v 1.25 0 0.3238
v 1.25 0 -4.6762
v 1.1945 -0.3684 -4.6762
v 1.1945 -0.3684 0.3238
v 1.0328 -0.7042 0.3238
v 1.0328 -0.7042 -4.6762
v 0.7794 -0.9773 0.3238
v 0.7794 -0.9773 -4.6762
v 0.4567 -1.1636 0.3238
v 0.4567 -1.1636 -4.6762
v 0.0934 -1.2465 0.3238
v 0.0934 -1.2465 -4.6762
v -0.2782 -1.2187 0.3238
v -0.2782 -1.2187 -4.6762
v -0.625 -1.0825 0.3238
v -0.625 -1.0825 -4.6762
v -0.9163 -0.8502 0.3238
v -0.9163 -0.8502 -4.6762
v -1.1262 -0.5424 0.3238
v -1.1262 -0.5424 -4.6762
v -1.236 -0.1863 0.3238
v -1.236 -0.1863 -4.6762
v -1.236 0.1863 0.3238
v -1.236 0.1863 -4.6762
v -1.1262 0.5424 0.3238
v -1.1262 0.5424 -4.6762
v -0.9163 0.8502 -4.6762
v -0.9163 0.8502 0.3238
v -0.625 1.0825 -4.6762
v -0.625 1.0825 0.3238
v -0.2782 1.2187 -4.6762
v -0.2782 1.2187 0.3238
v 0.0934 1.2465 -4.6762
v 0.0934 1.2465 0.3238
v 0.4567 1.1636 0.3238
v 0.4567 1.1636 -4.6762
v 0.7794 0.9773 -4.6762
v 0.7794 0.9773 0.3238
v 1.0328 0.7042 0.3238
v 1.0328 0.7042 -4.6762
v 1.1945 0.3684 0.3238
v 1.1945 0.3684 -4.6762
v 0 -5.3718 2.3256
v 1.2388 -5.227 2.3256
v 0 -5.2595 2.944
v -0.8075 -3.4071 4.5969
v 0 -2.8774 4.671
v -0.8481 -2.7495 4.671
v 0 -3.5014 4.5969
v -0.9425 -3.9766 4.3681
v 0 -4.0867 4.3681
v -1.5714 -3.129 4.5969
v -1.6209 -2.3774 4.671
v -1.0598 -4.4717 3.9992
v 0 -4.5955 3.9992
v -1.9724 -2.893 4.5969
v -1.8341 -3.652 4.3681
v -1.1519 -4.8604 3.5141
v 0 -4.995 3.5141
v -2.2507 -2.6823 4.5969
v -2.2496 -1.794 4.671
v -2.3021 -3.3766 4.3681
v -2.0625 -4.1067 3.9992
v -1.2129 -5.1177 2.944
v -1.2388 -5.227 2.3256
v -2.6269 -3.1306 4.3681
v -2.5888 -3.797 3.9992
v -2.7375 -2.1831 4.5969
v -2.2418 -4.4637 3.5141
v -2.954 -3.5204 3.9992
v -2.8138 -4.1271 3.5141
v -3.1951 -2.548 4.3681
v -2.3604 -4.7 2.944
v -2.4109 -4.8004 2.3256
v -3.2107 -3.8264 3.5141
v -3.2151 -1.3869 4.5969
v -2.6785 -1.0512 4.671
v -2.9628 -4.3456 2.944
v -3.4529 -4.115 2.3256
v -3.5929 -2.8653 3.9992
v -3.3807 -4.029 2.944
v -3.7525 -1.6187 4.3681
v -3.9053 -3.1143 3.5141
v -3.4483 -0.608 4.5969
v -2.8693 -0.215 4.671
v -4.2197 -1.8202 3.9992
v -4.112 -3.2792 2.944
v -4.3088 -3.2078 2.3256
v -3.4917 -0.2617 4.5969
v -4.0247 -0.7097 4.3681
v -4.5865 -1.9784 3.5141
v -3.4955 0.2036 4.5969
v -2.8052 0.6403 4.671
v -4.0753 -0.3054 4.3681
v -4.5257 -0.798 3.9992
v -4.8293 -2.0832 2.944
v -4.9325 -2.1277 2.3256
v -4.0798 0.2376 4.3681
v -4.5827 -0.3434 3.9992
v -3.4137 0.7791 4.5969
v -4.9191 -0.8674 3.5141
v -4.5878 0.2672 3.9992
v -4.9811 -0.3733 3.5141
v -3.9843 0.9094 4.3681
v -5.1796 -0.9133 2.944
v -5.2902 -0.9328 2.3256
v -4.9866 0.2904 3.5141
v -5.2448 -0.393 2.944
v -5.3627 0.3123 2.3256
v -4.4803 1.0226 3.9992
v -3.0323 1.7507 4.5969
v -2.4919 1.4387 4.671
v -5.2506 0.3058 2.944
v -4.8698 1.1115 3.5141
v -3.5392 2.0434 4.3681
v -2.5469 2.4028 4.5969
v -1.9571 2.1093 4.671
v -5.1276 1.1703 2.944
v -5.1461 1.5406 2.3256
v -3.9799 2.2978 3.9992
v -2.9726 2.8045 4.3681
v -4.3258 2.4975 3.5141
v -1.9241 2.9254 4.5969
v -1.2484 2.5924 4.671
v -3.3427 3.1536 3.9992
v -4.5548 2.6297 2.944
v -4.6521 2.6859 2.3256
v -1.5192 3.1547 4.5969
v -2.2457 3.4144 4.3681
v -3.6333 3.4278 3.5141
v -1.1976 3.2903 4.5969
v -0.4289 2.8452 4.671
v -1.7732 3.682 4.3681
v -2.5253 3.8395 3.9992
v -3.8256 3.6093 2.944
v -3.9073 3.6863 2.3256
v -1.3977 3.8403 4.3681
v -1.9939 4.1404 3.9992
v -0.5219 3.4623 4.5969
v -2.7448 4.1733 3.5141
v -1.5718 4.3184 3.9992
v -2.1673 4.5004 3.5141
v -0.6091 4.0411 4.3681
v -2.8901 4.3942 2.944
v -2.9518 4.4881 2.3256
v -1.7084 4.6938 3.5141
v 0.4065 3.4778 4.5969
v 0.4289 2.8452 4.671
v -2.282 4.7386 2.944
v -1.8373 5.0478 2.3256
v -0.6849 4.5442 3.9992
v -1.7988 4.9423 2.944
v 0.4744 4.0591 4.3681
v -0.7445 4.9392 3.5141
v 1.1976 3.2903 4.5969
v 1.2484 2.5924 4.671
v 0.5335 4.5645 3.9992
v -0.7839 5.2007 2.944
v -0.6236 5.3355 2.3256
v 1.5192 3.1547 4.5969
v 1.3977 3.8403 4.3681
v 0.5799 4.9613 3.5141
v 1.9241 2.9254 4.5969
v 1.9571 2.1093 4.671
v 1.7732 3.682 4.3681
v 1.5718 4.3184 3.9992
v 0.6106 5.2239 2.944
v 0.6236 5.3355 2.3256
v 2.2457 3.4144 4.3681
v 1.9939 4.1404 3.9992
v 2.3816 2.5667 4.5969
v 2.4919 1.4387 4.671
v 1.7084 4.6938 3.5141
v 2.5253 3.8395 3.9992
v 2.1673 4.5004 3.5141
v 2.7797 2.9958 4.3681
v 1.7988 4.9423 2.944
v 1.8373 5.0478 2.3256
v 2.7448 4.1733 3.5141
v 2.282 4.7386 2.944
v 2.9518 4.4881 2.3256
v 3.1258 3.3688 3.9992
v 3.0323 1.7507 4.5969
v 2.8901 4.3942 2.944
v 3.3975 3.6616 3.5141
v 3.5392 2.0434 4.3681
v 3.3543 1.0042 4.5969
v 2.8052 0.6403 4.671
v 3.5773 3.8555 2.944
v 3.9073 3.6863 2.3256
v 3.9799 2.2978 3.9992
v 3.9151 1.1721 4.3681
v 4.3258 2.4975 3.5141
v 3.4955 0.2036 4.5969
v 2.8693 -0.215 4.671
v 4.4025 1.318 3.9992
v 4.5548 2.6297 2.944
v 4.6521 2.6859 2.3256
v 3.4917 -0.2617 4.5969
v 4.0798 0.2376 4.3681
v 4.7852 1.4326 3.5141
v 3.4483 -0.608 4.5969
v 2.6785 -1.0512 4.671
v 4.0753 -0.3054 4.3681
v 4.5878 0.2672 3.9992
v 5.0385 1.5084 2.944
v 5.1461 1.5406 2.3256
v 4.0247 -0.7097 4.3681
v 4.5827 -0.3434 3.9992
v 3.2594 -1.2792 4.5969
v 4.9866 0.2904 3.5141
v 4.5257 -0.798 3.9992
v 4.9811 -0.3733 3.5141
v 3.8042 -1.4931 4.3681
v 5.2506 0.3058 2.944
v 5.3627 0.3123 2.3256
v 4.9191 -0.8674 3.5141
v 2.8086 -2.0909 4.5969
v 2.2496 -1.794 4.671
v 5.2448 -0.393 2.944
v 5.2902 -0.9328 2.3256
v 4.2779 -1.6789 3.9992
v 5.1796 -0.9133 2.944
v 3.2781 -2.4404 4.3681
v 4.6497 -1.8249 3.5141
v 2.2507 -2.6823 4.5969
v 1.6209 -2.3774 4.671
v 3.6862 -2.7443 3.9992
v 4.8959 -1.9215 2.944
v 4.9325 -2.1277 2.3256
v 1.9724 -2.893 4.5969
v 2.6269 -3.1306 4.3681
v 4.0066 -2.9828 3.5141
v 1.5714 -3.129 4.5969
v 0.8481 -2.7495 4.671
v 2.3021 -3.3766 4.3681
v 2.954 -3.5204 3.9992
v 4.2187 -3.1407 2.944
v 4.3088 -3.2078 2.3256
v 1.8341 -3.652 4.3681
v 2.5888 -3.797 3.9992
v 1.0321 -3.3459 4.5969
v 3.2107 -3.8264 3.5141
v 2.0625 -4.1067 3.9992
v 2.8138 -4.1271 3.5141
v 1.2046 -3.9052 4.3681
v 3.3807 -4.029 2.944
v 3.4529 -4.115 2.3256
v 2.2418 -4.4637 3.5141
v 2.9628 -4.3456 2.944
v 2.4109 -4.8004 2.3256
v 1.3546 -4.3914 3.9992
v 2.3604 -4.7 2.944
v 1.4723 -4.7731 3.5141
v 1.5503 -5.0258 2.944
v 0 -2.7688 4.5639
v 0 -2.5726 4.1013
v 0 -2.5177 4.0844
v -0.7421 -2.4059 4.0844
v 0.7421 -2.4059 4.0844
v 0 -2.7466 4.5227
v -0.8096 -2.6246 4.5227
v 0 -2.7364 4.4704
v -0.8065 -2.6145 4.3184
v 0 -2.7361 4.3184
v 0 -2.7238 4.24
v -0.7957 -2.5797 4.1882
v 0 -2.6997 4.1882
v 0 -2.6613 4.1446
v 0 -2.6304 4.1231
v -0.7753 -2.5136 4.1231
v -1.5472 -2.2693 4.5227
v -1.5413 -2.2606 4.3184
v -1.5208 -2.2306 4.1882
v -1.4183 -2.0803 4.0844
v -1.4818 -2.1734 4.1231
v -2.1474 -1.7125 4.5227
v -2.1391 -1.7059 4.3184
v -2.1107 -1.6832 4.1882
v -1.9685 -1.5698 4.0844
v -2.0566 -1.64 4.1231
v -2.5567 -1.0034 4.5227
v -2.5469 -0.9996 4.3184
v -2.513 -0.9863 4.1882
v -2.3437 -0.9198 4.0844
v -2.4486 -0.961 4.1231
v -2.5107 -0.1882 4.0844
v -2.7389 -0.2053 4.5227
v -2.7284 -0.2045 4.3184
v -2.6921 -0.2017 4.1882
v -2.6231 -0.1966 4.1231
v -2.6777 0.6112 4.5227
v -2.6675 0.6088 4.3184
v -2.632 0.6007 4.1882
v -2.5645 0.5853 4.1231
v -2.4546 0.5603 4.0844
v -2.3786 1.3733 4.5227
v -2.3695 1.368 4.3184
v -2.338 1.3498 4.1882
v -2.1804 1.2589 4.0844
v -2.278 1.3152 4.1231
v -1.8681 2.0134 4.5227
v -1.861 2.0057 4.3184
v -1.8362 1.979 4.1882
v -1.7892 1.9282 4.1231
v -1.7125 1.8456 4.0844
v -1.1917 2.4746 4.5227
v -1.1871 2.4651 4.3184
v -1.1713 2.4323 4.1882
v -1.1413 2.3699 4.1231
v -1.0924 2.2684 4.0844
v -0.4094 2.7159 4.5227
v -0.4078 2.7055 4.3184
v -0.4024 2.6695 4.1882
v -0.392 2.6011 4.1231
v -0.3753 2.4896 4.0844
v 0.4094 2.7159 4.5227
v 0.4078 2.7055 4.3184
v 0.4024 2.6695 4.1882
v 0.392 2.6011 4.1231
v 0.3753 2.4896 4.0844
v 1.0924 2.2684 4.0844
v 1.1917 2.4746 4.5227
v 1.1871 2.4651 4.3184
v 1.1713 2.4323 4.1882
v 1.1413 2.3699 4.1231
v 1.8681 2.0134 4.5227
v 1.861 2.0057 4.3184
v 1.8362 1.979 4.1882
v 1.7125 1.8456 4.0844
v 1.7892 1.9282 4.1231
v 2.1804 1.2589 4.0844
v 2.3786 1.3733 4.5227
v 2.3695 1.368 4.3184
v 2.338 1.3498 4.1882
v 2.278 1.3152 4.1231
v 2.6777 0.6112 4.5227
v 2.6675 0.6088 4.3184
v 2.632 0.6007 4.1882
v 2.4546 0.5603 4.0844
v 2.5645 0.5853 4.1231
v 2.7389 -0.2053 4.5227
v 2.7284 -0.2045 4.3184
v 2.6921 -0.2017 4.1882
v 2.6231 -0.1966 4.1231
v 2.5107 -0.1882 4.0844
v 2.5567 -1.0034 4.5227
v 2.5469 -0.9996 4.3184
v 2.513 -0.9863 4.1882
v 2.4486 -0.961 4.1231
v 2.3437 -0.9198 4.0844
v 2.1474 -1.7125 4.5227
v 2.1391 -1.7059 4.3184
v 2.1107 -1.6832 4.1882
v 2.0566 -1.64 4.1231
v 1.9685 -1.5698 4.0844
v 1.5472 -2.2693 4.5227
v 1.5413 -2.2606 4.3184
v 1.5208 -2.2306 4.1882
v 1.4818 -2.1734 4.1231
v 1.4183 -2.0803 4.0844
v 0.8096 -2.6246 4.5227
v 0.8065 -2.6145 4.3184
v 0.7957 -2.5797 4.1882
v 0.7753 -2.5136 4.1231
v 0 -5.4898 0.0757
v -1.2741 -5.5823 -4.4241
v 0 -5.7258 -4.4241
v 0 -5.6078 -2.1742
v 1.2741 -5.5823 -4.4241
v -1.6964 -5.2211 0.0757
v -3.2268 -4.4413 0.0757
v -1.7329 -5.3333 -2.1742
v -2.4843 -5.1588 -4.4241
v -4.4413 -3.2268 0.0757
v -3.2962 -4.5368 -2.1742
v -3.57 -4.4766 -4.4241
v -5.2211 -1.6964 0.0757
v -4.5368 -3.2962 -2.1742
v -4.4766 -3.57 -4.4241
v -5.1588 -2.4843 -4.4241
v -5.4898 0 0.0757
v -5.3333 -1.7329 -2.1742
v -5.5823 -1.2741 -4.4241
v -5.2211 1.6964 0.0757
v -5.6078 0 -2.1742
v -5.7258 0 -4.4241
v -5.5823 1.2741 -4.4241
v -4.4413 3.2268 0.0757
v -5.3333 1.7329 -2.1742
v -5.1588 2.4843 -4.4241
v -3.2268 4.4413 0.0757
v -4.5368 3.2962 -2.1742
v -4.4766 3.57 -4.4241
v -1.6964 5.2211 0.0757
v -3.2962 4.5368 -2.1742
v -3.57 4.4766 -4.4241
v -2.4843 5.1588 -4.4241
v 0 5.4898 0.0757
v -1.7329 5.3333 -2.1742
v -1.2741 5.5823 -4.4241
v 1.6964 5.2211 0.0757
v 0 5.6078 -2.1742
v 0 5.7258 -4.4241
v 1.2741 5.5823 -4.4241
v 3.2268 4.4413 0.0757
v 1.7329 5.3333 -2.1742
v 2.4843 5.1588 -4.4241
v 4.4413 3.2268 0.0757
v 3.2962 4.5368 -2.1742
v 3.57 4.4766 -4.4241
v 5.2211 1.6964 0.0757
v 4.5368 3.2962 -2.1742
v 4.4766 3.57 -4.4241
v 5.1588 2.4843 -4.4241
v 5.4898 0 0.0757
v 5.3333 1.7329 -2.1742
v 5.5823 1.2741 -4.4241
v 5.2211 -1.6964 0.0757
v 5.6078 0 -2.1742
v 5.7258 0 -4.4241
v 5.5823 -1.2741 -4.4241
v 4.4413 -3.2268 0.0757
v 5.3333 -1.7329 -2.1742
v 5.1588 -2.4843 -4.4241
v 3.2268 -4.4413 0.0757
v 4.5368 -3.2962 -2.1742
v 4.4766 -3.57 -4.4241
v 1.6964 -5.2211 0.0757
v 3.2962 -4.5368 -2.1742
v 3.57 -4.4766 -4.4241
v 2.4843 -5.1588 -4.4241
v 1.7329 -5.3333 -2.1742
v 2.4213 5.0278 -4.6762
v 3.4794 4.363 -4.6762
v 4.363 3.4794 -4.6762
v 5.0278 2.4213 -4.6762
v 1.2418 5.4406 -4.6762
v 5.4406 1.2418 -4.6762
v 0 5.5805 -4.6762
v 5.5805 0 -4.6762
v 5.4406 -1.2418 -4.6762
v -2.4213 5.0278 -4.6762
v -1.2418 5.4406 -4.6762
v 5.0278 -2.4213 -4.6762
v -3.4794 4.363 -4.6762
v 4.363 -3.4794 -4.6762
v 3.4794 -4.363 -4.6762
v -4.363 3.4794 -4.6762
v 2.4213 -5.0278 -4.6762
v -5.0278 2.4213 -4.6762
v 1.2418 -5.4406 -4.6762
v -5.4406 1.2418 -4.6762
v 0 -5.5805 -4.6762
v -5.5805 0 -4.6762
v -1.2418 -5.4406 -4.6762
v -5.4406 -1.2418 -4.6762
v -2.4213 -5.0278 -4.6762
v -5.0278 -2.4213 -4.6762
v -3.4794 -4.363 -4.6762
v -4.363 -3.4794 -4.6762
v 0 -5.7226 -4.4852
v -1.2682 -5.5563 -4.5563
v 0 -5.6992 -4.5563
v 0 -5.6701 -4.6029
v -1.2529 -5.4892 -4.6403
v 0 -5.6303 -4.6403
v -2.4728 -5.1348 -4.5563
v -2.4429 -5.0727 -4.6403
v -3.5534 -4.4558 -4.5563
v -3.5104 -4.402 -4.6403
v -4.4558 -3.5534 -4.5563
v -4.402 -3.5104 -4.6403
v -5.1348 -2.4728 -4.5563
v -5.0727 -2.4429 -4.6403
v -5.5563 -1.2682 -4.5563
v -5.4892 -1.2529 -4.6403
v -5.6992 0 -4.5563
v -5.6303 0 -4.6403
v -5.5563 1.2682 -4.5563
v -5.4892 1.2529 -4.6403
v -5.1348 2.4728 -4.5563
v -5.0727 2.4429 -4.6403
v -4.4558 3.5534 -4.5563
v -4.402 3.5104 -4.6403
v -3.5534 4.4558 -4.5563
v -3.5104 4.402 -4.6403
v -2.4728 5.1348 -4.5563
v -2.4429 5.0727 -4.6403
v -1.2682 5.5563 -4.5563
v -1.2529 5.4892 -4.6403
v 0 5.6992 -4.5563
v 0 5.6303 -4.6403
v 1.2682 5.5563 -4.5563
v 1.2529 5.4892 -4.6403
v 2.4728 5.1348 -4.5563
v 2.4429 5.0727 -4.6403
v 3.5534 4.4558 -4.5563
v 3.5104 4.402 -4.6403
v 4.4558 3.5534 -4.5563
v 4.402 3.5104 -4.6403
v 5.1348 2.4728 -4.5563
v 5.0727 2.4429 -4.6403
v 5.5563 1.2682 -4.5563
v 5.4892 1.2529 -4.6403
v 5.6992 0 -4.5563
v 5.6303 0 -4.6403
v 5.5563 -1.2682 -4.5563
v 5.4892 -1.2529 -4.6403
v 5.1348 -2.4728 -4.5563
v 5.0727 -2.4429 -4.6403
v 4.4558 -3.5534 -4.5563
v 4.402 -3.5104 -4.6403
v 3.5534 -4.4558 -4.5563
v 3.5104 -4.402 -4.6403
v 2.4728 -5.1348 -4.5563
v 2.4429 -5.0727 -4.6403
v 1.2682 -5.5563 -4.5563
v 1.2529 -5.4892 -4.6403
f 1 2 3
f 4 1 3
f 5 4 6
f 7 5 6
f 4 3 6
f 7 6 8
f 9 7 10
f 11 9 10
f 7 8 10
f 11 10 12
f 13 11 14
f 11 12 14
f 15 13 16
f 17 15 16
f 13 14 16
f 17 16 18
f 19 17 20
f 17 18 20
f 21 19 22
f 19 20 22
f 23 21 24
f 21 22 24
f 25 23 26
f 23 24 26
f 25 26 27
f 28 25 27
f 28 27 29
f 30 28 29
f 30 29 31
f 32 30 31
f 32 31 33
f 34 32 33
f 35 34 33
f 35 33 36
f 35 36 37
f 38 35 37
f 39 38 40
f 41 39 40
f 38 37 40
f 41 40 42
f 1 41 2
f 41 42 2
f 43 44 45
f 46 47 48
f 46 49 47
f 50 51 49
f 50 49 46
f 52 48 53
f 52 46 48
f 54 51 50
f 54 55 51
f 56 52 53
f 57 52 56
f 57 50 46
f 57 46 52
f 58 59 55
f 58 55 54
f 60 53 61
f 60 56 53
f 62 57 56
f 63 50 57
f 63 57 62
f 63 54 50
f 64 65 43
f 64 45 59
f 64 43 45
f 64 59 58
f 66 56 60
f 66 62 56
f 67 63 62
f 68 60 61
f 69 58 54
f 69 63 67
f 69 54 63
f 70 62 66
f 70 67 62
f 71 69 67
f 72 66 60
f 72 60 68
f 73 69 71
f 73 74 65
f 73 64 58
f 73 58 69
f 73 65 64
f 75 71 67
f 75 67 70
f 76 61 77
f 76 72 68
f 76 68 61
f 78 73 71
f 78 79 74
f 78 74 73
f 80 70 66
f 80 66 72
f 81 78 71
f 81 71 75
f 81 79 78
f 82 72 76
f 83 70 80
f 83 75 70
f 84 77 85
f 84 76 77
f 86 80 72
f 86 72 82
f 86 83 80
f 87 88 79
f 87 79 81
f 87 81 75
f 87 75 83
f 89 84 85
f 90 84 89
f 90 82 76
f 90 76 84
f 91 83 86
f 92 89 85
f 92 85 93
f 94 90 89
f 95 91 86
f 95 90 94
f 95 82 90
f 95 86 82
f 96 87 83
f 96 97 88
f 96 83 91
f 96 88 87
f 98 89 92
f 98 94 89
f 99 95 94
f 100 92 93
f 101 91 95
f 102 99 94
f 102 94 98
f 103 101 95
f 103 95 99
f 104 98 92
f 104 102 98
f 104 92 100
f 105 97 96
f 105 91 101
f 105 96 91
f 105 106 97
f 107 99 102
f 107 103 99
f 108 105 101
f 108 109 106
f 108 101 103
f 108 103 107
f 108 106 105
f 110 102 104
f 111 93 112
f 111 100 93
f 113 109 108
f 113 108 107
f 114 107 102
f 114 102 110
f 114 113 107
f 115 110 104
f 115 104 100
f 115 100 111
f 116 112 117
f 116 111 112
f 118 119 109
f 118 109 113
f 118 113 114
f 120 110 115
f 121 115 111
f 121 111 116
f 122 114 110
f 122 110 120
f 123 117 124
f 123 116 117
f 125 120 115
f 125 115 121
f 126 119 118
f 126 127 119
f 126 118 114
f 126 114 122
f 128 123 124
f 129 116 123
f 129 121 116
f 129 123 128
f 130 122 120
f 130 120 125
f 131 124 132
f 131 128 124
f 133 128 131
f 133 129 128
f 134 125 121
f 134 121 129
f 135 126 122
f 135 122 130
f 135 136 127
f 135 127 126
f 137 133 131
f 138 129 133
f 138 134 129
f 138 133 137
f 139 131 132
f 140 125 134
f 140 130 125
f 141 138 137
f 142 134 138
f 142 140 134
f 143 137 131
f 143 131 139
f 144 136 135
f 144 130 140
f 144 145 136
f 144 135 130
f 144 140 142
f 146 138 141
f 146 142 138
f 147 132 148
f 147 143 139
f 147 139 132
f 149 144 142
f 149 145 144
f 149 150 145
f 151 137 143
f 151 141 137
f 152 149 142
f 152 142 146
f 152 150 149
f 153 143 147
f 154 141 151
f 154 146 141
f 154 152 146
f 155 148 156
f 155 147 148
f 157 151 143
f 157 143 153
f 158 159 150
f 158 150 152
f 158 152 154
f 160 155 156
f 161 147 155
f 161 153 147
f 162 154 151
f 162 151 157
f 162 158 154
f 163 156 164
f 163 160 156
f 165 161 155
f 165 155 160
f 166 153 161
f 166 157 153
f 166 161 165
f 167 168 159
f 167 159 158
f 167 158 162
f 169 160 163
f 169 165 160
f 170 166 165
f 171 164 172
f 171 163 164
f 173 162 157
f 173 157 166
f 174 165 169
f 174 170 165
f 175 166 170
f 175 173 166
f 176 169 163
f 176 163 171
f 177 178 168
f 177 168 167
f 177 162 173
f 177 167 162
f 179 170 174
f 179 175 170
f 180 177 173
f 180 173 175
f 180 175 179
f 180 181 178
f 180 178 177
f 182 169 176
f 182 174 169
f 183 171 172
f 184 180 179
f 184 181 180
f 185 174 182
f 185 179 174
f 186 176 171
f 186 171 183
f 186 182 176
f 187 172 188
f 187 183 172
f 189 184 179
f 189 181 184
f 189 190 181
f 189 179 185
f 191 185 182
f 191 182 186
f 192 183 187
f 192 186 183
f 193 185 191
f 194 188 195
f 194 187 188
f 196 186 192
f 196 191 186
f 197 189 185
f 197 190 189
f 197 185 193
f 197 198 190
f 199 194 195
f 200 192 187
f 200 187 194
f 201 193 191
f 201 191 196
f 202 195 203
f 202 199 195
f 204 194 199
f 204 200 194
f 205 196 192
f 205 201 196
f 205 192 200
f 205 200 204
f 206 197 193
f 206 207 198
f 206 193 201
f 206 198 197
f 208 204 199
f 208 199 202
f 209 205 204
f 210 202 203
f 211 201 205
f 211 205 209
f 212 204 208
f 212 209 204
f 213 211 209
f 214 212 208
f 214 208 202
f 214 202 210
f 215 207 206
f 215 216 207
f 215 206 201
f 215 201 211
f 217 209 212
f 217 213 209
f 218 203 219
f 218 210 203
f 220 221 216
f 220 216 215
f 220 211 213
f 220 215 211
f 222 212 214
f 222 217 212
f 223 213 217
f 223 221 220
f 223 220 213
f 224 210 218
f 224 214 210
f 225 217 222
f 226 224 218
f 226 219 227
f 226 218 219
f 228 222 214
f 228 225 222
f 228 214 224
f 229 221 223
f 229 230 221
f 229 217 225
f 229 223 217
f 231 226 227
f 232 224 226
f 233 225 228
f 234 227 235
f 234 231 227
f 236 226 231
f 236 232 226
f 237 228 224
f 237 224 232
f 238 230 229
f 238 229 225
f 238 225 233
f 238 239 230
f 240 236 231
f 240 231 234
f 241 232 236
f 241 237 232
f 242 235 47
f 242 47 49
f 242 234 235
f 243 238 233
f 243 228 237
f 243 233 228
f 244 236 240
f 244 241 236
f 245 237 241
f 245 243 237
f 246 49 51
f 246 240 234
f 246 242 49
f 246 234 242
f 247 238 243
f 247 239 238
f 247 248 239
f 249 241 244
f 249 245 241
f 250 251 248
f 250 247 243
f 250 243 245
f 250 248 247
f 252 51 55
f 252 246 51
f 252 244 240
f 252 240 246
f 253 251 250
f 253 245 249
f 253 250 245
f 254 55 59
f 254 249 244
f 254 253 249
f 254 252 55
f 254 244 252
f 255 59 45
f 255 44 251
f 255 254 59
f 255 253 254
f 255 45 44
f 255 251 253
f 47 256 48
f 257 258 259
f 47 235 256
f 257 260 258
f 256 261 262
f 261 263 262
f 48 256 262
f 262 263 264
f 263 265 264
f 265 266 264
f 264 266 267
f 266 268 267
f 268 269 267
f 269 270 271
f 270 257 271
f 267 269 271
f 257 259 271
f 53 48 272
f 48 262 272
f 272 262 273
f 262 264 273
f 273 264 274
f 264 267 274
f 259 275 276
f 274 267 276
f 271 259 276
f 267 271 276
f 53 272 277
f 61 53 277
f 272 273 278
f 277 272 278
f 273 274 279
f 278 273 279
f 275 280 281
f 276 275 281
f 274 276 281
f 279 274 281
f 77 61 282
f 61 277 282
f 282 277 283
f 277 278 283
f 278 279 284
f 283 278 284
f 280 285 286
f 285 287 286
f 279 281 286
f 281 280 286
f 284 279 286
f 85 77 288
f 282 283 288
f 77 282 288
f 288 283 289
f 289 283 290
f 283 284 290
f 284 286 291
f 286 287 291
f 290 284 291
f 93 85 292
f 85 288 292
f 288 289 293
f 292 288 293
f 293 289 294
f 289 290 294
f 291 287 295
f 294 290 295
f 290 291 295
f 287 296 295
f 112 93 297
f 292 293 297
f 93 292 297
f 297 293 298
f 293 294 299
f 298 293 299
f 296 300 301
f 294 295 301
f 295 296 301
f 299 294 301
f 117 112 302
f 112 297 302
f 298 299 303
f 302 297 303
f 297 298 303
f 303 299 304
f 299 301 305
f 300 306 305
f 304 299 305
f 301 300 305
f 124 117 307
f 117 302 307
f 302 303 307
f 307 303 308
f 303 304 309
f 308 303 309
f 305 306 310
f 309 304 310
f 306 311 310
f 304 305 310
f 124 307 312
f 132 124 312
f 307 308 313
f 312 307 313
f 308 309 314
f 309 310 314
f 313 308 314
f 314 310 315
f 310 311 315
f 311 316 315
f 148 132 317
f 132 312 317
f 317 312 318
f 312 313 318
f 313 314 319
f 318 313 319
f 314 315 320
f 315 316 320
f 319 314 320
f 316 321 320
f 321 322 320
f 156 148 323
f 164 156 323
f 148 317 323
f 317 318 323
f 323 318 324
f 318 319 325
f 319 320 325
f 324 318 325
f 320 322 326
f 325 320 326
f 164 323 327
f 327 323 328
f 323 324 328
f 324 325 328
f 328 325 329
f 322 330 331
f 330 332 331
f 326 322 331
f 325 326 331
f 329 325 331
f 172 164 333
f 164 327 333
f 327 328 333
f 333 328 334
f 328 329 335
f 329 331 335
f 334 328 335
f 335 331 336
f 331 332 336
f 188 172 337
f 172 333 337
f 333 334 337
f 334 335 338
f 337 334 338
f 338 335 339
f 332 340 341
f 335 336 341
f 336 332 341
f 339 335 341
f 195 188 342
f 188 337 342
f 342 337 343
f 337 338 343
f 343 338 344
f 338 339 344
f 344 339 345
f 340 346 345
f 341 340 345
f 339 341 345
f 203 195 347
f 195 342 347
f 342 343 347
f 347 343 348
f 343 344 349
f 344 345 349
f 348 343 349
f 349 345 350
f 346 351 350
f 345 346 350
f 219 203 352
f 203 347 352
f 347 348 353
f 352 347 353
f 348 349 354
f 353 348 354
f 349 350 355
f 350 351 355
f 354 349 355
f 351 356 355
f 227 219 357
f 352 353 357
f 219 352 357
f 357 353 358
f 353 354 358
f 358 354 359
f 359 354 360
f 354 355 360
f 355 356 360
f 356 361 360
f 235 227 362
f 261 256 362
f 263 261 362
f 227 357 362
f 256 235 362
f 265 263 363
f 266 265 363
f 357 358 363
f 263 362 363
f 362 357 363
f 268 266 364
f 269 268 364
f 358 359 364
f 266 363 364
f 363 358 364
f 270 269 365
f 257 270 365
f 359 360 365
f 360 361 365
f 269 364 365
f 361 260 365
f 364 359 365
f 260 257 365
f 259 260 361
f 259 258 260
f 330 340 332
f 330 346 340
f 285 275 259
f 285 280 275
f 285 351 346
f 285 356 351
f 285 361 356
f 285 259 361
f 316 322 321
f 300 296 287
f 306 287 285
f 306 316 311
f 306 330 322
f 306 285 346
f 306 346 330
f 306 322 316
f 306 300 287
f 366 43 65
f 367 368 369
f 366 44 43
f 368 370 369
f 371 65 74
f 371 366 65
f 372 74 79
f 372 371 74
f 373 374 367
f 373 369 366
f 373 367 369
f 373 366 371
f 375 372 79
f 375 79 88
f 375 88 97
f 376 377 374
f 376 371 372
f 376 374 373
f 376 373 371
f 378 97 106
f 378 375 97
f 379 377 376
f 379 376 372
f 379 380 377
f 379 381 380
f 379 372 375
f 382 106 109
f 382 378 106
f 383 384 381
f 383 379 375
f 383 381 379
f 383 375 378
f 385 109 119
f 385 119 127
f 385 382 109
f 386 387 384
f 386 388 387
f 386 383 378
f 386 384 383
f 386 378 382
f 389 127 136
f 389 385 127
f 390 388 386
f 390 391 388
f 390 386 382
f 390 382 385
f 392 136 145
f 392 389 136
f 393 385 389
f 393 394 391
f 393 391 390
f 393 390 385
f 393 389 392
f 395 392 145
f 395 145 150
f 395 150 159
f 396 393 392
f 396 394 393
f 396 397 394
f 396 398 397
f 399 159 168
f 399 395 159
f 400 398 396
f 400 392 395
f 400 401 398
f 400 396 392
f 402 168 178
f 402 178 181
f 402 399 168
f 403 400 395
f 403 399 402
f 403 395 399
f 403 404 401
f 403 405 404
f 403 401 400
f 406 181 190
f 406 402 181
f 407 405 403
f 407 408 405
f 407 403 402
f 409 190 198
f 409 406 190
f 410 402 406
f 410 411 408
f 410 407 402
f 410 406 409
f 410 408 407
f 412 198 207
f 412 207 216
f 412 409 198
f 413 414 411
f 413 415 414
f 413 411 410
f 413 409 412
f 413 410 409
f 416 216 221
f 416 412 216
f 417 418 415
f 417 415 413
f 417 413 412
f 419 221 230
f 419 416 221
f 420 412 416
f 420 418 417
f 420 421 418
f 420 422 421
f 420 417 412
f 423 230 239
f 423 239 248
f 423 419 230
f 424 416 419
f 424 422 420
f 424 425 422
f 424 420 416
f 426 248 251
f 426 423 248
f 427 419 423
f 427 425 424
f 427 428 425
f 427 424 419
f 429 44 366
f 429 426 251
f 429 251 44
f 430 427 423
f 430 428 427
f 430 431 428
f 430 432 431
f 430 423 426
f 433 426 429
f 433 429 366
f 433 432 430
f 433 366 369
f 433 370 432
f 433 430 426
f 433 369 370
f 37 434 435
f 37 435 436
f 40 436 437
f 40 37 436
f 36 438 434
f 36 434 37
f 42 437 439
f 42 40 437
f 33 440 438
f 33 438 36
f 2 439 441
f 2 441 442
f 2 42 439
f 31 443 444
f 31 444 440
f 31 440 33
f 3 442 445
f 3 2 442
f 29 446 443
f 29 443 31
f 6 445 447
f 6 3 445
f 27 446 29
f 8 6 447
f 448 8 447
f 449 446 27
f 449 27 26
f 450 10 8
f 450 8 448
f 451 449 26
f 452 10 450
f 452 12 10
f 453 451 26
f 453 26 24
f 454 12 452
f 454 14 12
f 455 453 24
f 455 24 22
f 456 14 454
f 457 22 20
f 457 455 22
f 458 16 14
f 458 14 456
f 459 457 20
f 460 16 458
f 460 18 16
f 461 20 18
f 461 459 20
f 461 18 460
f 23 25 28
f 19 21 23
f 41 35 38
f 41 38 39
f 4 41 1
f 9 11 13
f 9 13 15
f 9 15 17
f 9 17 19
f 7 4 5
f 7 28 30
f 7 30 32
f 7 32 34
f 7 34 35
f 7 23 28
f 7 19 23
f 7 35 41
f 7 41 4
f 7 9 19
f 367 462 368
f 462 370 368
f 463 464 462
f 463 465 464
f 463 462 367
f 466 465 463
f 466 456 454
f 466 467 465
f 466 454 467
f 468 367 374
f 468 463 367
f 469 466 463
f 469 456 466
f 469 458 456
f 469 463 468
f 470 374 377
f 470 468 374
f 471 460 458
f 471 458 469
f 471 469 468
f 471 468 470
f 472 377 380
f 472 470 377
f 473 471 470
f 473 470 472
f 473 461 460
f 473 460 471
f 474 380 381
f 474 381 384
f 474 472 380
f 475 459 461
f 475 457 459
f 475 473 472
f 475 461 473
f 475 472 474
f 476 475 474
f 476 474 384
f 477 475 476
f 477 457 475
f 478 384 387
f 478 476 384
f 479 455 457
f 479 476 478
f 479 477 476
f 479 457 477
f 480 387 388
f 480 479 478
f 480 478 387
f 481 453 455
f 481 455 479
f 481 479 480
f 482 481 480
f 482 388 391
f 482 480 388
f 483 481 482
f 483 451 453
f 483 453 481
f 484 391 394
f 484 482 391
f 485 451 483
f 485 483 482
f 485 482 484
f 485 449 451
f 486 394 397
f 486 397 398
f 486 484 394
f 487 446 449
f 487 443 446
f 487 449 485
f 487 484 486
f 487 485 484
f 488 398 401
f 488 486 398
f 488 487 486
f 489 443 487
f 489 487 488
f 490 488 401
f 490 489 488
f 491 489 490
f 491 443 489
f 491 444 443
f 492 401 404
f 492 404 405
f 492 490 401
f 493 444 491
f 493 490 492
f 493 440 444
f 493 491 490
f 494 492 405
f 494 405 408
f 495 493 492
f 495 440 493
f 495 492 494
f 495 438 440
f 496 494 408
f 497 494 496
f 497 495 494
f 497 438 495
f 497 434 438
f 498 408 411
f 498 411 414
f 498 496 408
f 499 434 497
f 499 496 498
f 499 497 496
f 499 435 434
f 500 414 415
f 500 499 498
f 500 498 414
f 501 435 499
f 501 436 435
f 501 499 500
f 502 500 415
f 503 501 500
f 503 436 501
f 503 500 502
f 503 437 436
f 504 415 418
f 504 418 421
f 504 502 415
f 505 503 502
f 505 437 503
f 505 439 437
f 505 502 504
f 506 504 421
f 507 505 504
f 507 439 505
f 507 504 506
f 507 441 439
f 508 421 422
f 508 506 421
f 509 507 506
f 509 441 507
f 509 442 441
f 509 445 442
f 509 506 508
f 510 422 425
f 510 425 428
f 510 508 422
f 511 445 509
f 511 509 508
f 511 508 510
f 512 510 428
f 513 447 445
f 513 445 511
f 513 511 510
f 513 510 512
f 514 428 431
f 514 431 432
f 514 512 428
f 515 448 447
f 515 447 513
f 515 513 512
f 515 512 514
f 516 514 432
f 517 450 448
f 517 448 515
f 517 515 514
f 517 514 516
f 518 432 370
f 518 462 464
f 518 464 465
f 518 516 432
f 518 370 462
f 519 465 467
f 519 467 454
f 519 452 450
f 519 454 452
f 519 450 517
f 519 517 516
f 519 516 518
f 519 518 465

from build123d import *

# Parameters (mm, degrees)
F3_R     = 1.25
F4_DEPTH = 5


with BuildPart() as f2:
    # F1 (on Right) → F2 (revolve)
    with BuildSketch(Plane.YZ):
        with BuildLine():
            Line((-5.3717833243, 2.3256304618), (-5.7258238085, -4.4241435826))
            add(Edge.make_bspline(
                [(-5.7258238085, -4.4241435826), (-5.7264351493, -4.4368966068), (-5.7277565417, -4.464461837), (-5.7161348447, -4.5164232593), (-5.6911095307, -4.5793291163), (-5.6496734627, -4.628407601), (-5.6046093237, -4.659526133), (-5.580468569, -4.6761962585)],
                knots=[0, 0, 0, 0, 0.1612359922, 0.3485061387, 0.5588807728, 0.7636934523, 1, 1, 1, 1], degree=3))
            Line((-5.580468569, -4.6761962585), (0, -4.6761962585))
            Line((0, -4.6761962585), (0, 4.0844450705))
            Line((0, 4.0844450705), (-2.5177469943, 4.0844450705))
            add(Edge.make_bspline(
                [(-2.8773788363, 4.6709873714), (-2.826659029, 4.6275849969), (-2.7331127599, 4.547534807), (-2.7357495643, 4.4104777312), (-2.7417141422, 4.2214380375), (-2.643748447, 4.1210795553), (-2.5745941834, 4.1023556975), (-2.5361450378, 4.0902416719), (-2.5177469943, 4.0844450705)],
                knots=[0, 0, 0, 0, 0.2051585718, 0.3783890356, 0.5853177161, 0.7573058689, 0.8838700543, 1, 1, 1, 1], degree=3))
            ThreePointArc((-2.8773788363, 4.6709873714), (-4.5955361552, 3.999193216), (-5.3717833243, 2.3256304618))
        make_face()
    revolve(axis=Axis((0, 0, -0.295875594), (0, 0, -1)))

    # F3 (on face) → F4 (cut)
    with BuildSketch(Plane(origin=(0, 0, -4.6761962585), x_dir=(1, 0, 0), z_dir=(0, 0, -1))):
        Circle(F3_R)
    extrude(amount=-F4_DEPTH, mode=Mode.SUBTRACT)


solid = f2.part
